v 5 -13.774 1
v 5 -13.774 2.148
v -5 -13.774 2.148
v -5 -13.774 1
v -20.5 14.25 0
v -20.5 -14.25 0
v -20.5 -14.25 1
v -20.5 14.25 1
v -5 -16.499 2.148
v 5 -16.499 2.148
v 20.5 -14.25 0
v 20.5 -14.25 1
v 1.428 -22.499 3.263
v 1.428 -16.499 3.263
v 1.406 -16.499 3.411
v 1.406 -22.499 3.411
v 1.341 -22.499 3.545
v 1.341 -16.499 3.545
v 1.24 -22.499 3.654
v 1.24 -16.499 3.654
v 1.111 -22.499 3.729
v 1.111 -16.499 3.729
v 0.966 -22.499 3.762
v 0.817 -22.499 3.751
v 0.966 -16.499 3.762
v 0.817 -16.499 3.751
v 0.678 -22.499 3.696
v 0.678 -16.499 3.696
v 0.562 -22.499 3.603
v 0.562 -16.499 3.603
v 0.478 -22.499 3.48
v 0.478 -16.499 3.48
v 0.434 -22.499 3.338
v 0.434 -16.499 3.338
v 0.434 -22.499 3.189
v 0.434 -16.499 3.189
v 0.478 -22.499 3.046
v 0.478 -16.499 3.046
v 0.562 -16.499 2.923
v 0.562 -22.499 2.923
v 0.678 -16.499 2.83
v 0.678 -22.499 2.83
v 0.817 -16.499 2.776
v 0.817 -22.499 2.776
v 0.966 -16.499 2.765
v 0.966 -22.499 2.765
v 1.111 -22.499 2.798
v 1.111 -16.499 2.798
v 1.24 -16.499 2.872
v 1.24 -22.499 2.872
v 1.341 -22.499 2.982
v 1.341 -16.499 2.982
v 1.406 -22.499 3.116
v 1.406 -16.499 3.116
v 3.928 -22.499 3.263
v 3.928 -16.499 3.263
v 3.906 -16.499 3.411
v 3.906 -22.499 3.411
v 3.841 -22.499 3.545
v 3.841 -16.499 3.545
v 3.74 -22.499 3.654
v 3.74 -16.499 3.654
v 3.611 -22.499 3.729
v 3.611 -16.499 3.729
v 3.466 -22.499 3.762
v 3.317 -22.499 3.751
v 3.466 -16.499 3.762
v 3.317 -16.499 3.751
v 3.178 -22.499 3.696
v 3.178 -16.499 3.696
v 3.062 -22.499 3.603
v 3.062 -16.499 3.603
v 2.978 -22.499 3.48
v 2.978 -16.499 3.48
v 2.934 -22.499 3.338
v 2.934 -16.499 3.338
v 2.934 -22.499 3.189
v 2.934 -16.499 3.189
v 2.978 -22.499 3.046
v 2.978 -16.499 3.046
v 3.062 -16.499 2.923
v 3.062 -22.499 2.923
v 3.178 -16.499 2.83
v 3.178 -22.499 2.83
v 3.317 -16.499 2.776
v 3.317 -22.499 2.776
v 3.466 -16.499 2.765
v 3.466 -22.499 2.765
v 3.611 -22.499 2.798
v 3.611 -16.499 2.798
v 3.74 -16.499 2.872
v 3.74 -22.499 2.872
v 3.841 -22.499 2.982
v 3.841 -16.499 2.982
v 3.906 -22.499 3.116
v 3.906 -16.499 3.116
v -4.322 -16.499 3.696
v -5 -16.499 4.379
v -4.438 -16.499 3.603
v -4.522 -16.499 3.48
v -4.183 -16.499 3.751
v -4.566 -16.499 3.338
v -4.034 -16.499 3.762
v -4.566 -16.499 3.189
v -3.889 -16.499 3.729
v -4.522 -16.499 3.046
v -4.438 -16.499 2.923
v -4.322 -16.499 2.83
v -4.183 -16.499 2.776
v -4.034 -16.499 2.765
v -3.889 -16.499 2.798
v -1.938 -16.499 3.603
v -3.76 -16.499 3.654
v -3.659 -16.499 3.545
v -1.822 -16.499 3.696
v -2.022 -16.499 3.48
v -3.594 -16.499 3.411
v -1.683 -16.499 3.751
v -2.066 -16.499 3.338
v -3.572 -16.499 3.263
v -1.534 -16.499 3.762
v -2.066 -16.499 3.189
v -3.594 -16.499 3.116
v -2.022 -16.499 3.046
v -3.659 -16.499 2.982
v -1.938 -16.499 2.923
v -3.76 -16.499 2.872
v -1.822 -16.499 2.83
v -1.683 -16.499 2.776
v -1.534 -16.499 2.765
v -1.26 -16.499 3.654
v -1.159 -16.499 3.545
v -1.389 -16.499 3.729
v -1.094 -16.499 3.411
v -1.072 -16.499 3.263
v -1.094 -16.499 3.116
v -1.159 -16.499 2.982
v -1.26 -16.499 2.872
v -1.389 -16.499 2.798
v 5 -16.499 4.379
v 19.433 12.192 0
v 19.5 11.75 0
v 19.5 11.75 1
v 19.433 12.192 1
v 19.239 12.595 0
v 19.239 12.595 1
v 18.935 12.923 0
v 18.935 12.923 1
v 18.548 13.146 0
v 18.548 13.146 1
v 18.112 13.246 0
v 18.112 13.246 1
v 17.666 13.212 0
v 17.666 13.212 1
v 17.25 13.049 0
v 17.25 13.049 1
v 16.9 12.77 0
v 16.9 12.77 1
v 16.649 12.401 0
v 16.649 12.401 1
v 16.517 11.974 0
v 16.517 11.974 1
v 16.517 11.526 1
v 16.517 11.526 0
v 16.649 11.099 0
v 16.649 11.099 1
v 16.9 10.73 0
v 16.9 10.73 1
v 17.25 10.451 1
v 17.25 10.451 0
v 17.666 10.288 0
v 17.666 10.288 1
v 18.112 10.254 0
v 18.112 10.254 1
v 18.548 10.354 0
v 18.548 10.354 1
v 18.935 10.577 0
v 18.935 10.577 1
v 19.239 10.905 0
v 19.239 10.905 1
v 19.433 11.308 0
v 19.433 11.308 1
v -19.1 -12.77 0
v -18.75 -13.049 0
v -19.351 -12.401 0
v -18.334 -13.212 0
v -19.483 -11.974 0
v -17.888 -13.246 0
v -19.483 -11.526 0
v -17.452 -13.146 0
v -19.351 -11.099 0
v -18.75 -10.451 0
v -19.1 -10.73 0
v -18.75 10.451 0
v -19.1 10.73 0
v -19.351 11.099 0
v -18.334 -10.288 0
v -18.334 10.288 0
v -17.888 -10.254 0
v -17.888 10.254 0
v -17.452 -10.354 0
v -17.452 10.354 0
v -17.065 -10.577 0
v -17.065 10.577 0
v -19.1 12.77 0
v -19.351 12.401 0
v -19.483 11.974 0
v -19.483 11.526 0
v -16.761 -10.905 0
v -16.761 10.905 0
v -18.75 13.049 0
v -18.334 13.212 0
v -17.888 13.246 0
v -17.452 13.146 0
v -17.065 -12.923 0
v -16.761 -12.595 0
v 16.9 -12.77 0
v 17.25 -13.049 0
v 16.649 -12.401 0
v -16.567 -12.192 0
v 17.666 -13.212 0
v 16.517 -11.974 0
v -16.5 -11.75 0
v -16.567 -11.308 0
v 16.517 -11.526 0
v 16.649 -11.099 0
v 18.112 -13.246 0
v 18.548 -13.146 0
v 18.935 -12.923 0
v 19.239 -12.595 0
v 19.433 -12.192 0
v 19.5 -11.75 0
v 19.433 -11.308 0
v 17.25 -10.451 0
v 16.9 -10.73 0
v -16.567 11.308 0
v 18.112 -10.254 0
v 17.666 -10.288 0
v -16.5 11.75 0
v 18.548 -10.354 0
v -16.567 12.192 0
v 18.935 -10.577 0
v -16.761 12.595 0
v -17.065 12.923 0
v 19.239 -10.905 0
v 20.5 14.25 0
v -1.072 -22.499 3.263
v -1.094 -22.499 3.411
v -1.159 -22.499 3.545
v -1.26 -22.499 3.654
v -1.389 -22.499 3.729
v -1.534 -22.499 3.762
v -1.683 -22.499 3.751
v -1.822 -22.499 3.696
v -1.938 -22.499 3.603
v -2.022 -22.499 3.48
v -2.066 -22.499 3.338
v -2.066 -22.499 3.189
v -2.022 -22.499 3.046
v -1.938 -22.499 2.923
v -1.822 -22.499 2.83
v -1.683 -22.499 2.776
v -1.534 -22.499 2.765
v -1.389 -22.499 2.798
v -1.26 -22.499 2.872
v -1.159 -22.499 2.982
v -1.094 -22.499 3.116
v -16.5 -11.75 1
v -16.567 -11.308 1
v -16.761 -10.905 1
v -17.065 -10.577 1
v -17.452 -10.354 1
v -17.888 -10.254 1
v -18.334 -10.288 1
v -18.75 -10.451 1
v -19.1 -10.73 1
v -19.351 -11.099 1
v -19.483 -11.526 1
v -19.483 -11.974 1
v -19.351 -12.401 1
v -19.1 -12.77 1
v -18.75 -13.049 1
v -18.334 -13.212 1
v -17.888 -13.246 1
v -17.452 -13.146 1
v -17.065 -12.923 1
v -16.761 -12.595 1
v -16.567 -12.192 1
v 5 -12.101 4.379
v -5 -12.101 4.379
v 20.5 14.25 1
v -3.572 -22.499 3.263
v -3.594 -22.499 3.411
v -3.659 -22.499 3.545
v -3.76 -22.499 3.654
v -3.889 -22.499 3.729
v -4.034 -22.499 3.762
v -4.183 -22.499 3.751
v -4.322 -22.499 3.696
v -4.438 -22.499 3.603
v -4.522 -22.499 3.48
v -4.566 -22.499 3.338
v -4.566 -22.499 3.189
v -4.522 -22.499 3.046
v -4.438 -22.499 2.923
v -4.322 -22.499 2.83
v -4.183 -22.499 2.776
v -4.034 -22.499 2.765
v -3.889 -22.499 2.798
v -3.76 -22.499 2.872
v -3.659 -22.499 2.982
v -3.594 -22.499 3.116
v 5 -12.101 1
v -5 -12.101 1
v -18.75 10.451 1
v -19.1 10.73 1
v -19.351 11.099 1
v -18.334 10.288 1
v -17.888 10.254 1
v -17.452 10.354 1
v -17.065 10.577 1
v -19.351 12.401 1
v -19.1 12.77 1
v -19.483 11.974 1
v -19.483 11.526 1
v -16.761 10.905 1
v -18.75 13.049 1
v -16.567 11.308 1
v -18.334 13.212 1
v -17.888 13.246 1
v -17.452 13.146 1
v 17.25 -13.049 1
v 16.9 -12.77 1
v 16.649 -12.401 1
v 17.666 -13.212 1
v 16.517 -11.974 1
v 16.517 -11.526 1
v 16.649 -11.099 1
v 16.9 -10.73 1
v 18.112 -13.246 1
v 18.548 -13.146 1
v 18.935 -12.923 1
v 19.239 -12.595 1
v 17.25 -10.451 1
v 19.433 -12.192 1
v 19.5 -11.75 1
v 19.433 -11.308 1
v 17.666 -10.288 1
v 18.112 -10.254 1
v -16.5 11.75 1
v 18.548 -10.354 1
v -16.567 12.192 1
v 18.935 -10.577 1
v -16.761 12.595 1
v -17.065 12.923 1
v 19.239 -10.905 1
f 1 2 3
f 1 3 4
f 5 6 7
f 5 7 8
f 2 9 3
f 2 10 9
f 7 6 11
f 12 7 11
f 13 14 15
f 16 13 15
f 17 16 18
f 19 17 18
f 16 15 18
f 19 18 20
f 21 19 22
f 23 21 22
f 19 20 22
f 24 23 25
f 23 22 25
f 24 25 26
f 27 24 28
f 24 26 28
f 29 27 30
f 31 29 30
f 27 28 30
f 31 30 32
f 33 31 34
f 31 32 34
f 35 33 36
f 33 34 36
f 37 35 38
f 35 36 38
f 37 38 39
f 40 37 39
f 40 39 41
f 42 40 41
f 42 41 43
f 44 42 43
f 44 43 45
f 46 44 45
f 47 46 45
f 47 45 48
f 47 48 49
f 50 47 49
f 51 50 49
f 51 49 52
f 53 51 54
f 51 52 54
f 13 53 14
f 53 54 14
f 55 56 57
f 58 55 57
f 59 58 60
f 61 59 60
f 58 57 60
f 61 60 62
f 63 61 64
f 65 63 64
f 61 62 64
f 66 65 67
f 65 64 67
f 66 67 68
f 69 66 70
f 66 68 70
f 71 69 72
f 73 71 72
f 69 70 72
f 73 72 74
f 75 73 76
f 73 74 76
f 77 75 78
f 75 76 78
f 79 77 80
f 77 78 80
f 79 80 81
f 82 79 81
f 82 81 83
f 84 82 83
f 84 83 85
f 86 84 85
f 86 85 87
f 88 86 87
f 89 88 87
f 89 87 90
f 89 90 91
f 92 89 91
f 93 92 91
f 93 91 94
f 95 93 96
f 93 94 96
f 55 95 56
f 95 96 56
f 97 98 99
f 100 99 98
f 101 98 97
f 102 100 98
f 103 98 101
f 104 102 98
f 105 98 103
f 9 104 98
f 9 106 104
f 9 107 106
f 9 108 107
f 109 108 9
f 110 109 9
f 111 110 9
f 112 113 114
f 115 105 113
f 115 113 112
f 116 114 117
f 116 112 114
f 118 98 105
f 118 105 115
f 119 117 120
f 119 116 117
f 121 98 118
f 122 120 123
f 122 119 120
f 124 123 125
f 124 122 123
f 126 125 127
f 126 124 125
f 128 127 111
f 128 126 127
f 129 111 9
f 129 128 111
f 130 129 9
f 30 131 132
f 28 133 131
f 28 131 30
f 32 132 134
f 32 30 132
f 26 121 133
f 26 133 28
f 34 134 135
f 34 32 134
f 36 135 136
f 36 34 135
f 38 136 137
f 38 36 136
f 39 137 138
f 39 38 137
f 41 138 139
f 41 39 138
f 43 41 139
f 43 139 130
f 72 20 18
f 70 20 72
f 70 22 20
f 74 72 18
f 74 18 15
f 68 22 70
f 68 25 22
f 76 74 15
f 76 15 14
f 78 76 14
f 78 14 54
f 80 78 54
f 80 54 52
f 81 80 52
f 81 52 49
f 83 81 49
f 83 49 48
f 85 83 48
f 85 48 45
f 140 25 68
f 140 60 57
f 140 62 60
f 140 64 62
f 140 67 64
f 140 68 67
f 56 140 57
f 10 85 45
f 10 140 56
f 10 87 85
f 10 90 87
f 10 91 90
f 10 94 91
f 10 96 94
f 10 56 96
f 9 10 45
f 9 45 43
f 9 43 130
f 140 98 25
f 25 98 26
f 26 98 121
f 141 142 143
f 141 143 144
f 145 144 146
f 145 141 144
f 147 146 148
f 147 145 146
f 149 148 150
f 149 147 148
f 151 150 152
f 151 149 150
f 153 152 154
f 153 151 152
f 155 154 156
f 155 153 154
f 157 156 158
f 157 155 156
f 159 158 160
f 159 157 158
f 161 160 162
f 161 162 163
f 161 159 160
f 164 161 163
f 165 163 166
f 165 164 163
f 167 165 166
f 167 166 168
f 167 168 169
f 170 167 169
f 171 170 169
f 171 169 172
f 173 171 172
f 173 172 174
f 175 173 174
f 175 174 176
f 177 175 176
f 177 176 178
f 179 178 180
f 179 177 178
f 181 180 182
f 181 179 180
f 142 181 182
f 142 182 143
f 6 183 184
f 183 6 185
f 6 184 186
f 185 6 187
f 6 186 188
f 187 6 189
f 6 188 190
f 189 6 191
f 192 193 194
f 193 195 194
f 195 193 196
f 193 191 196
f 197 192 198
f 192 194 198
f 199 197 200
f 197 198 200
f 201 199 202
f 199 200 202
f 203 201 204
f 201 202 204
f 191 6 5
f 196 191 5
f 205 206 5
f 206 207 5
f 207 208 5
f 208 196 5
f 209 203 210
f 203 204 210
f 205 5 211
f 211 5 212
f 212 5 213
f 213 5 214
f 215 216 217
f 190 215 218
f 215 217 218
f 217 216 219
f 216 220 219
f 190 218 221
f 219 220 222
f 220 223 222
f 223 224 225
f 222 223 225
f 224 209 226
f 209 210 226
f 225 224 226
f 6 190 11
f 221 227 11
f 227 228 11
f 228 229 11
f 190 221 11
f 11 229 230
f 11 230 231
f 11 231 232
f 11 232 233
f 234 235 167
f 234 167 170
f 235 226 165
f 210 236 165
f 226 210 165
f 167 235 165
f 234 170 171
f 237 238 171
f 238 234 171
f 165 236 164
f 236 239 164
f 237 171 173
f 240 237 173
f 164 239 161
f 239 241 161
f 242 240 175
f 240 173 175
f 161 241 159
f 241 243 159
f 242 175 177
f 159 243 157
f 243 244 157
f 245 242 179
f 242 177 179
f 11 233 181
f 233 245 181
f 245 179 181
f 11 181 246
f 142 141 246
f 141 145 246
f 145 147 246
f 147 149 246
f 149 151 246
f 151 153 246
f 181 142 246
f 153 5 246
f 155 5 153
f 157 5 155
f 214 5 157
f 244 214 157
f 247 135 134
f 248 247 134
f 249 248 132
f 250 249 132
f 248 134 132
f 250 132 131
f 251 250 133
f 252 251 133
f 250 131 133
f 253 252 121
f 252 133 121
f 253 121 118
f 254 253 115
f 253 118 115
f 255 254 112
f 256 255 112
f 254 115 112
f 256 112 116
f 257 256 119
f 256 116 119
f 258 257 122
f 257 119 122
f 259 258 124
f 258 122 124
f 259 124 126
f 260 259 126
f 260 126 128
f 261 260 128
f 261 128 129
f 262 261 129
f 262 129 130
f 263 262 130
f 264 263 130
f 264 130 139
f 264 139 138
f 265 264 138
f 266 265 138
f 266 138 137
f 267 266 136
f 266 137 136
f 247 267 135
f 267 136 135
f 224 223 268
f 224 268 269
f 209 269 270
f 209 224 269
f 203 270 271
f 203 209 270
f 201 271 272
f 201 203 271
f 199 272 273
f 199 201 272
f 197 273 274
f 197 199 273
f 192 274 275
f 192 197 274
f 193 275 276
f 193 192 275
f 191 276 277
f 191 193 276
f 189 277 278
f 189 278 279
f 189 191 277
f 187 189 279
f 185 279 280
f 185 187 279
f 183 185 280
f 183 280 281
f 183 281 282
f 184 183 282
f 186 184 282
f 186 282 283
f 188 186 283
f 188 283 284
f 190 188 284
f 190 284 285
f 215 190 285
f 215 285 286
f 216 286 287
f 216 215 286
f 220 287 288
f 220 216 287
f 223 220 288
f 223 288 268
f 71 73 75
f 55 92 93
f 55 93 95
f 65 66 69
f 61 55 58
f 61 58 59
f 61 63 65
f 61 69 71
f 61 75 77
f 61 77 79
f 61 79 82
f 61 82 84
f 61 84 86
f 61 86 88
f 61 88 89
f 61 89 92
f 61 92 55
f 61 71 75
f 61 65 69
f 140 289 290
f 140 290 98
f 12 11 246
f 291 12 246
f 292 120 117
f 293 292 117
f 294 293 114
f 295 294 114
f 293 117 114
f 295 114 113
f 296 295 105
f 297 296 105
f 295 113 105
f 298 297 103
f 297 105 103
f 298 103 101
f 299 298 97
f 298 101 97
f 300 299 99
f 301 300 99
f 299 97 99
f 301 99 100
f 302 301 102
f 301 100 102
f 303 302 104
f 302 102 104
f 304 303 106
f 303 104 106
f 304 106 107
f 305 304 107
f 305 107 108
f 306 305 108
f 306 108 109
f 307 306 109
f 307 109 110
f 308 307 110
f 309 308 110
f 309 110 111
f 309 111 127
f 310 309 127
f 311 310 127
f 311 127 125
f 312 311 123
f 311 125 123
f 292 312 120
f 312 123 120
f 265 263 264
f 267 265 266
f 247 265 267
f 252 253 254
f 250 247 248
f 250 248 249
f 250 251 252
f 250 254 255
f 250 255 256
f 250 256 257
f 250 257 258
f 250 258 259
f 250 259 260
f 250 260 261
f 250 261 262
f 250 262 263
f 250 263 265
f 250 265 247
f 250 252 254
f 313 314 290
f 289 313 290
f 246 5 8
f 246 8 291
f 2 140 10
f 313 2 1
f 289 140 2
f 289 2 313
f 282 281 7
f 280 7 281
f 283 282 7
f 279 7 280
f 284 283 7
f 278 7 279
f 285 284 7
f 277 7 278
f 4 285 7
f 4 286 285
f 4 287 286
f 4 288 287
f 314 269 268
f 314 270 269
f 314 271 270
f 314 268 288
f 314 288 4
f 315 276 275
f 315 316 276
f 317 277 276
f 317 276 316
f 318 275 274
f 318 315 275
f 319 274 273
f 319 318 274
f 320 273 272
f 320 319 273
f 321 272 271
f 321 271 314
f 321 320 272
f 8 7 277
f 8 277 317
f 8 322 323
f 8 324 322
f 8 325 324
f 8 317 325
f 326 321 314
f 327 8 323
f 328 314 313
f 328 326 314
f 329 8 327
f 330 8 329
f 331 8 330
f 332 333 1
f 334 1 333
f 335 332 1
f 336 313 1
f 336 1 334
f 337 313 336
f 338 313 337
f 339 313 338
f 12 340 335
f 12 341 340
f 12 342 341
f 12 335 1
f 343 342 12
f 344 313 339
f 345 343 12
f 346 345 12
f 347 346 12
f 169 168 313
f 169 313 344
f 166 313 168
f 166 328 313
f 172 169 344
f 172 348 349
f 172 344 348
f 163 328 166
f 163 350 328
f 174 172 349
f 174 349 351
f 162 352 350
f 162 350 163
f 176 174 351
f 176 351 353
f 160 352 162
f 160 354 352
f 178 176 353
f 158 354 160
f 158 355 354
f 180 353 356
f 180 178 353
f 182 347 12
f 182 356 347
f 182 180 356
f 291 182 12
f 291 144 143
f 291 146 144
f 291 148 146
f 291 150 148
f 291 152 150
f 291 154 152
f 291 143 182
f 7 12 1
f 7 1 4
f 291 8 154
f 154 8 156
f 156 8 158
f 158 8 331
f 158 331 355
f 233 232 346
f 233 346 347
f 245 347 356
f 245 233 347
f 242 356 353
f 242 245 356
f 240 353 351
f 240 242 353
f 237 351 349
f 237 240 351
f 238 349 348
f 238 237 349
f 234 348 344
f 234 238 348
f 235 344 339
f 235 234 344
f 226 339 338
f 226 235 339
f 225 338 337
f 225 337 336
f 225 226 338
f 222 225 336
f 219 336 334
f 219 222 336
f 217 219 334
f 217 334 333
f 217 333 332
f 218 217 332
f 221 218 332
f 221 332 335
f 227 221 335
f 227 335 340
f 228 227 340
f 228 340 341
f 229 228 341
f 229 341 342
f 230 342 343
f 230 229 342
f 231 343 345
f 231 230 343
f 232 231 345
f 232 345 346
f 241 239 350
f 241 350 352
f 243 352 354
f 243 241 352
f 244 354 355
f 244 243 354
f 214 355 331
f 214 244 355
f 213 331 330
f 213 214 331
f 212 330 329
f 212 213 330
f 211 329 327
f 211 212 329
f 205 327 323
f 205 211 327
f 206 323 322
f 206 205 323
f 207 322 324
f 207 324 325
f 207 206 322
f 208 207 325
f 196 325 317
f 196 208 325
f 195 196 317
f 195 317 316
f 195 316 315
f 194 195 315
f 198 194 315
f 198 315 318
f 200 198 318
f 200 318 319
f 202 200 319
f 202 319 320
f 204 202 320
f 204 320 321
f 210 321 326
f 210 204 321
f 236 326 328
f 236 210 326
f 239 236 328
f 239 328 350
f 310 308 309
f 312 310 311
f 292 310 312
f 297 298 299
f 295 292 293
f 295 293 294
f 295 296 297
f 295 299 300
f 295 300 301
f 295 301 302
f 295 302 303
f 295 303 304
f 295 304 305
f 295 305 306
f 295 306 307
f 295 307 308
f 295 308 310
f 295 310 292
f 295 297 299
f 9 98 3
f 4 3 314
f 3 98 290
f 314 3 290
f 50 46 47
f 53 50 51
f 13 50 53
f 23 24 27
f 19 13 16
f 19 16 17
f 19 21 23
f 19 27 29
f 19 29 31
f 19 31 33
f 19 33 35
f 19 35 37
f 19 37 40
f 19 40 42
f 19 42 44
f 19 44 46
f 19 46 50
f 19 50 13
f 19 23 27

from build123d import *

# Parameters (mm, degrees)
F0_W          = 41
F0_H          = 28.5
F0_R          = 1.5
F1_DEPTH      = 1
F3_DEPTH      = 5
F3_DEPTH_BACK = 5
F4_R          = 0.5
F5_DEPTH      = 6


with BuildPart() as f1:
    # F0 (on Top) → F1 (new body)
    with BuildSketch(Plane.XY):
        Rectangle(F0_W, F0_H)
        with Locations((-18, -11.75)):
            Circle(F0_R, mode=Mode.SUBTRACT)
        with Locations((18, -11.75)):
            Circle(F0_R, mode=Mode.SUBTRACT)
        with Locations((-18, 11.75)):
            Circle(F0_R, mode=Mode.SUBTRACT)
        with Locations((18, 11.75)):
            Circle(F0_R, mode=Mode.SUBTRACT)
    extrude(amount=F1_DEPTH)

    # F2 (on Right) → F3 (join, two sides)
    with BuildSketch(Plane.YZ) as f3_sk:
        Polygon((-13.774308, 0.989061), (-12.100797, 0.989061), (-12.100797, 4.378995), (-16.49913, 4.378995), (-16.49913, 2.147646), (-13.774308, 2.147646), align=None)
    extrude(amount=F3_DEPTH)
    extrude(f3_sk.sketch, amount=-F3_DEPTH_BACK)

    # F4 (on face) → F5 (join)
    with BuildSketch(Plane.XZ.offset(16.49913)):
        with Locations((-4.071627, 3.263321)):
            Circle(F4_R)
        with Locations((-1.571627, 3.263321)):
            Circle(F4_R)
        with Locations((0.928373, 3.263321)):
            Circle(F4_R)
        with Locations((3.428373, 3.263321)):
            Circle(F4_R)
    extrude(amount=F5_DEPTH)


solid = f1.part
